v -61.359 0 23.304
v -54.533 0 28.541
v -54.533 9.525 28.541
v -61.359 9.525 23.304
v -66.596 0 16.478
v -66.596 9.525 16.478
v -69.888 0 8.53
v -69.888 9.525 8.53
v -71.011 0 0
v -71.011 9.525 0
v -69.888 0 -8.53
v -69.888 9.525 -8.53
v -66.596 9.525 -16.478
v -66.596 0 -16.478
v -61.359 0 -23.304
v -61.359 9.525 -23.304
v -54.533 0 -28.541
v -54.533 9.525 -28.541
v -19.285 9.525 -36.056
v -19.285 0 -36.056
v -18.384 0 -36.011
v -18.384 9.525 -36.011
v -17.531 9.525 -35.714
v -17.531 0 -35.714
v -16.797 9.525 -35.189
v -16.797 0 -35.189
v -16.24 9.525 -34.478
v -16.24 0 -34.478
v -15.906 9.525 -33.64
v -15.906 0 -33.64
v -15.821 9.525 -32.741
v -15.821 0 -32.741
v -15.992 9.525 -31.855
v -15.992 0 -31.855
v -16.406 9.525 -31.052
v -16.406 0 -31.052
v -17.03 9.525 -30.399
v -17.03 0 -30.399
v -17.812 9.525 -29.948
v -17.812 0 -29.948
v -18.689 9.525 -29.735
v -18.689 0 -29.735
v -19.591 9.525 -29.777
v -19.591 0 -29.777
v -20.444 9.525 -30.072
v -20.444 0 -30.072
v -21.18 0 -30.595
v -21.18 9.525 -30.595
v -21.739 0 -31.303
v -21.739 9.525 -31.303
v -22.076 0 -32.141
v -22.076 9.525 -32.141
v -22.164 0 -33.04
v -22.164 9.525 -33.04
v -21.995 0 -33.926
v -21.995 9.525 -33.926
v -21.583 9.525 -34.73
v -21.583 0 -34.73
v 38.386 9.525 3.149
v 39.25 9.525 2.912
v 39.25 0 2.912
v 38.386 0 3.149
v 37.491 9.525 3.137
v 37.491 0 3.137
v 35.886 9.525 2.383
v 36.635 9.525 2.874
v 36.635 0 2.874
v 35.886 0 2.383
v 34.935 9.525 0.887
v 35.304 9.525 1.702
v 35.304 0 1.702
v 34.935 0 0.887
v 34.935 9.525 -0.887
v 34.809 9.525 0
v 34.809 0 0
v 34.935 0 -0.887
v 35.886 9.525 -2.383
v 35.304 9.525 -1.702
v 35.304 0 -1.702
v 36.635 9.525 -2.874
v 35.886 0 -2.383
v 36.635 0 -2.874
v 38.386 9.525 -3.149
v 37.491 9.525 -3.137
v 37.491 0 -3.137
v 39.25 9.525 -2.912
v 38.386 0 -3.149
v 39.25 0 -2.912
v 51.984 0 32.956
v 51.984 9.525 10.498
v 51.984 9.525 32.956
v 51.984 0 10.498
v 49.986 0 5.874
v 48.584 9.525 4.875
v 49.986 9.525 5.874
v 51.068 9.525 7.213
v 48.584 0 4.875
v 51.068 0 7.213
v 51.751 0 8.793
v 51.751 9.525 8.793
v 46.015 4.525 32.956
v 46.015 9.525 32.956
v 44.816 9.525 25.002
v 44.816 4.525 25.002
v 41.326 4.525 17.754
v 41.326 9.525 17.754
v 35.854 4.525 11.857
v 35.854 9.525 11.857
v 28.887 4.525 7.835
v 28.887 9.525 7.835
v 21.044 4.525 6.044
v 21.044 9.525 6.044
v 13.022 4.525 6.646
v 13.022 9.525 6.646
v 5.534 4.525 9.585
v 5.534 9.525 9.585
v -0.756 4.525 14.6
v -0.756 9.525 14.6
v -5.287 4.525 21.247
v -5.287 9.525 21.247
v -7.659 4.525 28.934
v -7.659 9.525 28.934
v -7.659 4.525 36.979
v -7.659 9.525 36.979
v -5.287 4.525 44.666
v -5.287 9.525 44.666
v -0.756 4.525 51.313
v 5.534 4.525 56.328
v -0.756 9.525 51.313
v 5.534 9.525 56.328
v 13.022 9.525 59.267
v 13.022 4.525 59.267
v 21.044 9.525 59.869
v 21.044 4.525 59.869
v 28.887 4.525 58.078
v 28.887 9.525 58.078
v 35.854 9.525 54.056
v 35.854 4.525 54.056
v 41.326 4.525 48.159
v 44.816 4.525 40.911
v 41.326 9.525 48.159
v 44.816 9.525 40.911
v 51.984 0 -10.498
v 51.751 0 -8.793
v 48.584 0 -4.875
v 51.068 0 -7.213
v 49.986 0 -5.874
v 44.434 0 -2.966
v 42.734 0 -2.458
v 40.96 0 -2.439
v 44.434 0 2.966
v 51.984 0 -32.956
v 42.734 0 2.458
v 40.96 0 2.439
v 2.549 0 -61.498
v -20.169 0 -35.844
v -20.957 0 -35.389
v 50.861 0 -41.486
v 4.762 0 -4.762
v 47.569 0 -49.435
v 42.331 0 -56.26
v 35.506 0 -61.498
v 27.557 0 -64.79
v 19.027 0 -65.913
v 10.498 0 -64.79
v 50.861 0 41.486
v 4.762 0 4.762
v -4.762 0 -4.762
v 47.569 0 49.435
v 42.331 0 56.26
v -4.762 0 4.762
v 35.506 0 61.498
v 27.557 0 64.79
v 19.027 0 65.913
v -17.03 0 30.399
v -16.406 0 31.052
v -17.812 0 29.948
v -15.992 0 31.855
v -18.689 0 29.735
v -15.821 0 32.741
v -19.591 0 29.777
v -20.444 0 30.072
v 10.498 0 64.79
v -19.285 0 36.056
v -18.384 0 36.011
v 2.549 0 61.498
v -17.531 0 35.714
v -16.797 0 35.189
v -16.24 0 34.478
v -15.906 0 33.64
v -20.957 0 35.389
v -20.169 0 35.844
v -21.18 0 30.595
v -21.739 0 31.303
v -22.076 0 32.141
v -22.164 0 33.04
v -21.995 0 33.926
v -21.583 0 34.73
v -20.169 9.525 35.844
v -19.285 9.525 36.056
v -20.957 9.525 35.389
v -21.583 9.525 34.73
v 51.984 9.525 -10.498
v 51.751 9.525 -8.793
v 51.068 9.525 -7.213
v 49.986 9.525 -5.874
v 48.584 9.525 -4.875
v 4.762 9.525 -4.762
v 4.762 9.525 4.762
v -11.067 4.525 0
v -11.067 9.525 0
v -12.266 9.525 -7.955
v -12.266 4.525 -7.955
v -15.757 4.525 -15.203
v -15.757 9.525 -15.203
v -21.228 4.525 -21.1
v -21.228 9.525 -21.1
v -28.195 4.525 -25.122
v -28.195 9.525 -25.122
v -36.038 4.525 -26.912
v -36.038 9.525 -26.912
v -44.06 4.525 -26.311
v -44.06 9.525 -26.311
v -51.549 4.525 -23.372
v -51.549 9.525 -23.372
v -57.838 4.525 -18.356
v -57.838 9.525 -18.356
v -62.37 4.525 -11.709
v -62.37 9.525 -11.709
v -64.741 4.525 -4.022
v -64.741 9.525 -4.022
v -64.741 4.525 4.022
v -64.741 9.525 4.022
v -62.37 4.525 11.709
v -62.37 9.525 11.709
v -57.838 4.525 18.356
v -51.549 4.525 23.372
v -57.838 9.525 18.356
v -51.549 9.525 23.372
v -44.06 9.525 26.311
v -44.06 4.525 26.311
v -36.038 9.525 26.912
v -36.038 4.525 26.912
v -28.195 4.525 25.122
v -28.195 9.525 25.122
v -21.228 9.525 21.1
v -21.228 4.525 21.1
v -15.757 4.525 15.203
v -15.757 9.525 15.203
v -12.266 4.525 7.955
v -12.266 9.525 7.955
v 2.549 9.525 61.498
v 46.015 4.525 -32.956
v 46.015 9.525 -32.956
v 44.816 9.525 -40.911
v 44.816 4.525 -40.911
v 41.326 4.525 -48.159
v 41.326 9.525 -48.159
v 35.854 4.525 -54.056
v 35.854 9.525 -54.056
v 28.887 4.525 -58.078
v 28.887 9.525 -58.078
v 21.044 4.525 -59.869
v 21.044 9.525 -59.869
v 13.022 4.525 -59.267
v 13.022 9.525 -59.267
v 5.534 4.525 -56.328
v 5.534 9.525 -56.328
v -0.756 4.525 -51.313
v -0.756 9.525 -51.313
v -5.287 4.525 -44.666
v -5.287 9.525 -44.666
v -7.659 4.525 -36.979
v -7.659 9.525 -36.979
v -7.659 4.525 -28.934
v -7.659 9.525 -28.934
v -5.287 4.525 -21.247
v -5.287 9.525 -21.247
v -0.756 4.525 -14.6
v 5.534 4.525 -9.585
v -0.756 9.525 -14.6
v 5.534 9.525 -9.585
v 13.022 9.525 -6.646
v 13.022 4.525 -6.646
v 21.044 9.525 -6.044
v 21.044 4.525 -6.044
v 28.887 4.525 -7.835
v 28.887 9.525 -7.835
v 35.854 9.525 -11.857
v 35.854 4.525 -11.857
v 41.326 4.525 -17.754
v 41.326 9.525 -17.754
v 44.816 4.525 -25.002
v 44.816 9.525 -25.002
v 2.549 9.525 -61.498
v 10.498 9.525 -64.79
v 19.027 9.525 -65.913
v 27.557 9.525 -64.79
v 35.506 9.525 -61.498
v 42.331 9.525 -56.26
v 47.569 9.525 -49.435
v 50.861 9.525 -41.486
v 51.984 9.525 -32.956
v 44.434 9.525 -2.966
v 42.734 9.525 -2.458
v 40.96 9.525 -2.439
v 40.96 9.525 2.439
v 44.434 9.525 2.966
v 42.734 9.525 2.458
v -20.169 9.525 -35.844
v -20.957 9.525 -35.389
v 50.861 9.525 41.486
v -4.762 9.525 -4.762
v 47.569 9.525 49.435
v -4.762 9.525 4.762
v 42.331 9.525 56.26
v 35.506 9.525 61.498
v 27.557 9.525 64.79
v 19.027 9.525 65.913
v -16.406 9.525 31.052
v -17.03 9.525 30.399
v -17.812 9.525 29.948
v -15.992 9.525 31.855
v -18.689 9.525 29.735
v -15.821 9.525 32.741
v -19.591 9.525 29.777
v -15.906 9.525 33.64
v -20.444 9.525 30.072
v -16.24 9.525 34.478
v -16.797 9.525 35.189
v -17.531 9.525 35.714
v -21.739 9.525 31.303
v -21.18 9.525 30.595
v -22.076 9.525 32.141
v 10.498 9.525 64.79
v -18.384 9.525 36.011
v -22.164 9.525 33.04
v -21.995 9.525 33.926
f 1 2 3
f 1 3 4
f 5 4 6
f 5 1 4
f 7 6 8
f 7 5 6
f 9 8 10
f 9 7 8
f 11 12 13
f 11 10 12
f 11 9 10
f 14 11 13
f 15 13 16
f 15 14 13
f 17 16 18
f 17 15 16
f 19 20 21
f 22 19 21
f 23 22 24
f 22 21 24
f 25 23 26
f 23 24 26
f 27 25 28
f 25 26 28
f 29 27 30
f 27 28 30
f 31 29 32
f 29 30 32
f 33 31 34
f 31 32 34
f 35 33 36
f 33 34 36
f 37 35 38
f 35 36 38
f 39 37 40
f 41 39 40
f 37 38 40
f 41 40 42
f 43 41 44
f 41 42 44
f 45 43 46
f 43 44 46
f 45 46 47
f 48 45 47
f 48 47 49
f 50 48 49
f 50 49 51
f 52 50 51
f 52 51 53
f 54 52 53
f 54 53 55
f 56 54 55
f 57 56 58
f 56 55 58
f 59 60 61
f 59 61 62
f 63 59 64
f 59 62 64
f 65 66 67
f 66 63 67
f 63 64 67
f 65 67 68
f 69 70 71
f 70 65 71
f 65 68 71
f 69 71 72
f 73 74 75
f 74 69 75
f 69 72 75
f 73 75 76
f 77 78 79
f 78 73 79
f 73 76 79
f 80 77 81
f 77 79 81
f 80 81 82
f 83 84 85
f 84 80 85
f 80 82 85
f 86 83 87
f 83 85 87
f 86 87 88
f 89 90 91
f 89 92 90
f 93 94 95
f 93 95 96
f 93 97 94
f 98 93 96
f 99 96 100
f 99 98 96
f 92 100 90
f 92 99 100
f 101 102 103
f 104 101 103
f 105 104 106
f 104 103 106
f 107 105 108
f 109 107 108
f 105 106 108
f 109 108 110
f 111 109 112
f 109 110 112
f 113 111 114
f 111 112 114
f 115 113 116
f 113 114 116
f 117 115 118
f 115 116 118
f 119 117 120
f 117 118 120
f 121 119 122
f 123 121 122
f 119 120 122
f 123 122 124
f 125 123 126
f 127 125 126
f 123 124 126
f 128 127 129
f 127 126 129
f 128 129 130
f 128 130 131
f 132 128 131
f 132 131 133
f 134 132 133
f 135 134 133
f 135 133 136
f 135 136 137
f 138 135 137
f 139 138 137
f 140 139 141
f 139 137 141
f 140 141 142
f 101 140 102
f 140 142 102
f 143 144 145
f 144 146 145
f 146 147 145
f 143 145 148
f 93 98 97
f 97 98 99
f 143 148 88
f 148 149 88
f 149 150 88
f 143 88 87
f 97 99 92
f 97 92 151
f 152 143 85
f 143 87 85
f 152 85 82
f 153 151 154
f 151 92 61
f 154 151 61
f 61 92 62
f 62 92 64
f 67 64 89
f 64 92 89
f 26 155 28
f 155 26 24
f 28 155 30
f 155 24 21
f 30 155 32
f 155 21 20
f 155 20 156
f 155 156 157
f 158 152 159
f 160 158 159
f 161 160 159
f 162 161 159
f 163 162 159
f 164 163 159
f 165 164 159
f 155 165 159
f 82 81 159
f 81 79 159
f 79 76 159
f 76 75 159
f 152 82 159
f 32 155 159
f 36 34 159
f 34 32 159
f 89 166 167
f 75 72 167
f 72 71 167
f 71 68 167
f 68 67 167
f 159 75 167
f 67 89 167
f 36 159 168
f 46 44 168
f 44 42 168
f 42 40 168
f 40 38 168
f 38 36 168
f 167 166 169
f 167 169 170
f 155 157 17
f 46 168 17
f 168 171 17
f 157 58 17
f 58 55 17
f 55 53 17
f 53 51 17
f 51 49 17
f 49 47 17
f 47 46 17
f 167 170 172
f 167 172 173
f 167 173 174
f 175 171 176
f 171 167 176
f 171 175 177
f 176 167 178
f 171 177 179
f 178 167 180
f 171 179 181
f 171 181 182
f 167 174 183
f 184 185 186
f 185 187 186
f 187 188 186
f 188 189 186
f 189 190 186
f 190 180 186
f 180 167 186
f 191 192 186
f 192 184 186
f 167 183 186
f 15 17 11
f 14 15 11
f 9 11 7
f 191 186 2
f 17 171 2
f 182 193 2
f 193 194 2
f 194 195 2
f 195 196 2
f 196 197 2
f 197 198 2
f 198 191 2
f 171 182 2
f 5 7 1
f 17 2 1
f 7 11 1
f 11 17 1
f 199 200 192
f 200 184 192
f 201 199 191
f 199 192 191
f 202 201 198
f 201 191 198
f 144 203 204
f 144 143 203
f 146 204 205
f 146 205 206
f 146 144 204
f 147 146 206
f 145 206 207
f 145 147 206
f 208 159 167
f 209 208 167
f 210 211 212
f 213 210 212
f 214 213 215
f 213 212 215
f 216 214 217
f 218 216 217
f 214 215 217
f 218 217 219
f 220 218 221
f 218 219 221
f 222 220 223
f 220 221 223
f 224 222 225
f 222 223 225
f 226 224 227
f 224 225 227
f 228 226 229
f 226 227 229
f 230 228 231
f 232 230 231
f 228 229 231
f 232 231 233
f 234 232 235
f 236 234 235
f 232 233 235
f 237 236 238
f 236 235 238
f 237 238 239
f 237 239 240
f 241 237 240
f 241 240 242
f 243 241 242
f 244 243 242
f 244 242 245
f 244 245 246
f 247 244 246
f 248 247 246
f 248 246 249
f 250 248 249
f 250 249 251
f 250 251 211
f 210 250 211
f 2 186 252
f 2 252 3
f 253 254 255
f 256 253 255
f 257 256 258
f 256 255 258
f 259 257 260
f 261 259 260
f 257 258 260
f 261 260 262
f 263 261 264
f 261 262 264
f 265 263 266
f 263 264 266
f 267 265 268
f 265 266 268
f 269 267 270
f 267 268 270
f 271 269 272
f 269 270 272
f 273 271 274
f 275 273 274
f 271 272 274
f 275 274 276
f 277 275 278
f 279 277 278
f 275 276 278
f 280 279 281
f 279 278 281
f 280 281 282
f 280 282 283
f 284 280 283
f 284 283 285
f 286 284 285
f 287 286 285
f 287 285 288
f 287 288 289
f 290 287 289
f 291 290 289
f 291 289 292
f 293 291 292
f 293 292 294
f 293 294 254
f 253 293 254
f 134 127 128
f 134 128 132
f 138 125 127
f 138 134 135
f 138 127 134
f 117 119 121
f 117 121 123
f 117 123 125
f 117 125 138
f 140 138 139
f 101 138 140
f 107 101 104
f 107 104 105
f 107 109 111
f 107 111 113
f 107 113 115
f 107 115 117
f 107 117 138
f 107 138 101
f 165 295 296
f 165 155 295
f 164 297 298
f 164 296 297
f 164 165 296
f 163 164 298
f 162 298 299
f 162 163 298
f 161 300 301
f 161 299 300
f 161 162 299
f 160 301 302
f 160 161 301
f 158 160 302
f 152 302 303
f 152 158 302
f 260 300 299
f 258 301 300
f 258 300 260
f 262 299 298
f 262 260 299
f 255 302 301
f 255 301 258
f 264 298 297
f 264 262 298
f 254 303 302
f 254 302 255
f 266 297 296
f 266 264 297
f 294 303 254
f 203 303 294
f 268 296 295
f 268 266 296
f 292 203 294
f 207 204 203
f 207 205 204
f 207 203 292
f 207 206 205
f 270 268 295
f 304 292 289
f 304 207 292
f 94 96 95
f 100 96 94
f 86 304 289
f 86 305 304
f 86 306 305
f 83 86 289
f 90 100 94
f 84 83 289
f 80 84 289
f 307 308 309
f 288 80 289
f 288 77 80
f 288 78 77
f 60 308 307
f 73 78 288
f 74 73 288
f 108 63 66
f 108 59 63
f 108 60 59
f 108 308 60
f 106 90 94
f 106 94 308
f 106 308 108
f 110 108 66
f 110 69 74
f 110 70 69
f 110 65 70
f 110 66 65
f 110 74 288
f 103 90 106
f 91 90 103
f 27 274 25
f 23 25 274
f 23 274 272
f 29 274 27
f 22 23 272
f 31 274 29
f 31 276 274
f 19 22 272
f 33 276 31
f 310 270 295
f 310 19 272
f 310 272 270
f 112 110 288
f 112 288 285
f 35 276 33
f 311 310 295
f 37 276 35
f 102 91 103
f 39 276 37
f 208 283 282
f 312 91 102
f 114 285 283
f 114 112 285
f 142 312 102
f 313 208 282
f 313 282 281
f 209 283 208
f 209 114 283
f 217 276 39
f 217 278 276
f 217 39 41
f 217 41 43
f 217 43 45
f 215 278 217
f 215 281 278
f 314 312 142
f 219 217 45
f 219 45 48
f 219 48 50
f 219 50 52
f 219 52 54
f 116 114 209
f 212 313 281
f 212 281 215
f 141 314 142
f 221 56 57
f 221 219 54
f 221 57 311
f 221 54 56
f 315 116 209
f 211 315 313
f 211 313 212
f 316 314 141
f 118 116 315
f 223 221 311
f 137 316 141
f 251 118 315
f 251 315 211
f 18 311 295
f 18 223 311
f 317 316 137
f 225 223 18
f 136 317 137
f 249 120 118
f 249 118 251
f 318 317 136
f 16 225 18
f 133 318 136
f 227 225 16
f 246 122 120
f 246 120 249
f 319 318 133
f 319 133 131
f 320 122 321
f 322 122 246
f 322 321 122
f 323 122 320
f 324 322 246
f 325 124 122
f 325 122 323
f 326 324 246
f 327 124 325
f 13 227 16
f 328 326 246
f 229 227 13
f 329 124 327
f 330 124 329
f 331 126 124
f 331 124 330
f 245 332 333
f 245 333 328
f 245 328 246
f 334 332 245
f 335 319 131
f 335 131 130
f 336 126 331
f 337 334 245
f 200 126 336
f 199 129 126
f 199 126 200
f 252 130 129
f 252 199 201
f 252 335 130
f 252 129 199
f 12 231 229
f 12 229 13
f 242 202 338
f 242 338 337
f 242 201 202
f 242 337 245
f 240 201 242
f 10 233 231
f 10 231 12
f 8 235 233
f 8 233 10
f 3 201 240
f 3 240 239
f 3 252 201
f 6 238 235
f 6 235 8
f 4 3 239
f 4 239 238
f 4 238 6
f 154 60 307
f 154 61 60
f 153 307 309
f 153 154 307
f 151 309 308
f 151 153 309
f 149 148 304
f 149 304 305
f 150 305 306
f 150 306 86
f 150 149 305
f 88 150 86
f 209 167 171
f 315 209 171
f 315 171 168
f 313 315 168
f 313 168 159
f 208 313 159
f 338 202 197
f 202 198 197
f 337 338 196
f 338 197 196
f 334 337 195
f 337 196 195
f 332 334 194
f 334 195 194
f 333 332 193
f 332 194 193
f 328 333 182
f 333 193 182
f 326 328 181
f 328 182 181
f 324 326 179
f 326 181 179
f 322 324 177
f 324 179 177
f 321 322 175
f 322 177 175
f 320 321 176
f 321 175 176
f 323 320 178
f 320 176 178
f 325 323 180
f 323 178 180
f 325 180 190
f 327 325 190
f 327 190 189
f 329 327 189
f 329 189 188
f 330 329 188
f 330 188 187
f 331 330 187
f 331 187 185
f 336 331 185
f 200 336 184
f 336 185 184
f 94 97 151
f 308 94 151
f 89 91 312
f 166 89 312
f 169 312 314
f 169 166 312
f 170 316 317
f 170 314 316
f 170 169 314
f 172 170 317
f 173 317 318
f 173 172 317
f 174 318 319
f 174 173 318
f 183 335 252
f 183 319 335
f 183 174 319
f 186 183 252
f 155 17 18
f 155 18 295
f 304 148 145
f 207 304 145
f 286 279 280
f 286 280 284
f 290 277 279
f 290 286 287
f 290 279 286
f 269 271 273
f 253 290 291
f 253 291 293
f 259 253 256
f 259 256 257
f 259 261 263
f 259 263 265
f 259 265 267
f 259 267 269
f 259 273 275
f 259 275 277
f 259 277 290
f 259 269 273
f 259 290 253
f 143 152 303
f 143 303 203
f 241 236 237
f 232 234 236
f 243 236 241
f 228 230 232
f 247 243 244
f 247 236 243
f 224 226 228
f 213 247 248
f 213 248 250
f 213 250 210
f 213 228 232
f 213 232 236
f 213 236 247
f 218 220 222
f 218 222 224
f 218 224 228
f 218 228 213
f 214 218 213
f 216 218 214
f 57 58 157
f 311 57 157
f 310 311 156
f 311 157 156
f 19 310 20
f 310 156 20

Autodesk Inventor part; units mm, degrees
ref_plane "YZ Plane" through (0, 0, 0) normal (1, 0, 0) x (0, 1, 0)
ref_plane "XZ Plane" through (0, 0, 0) normal (0, 1, 0) x (-1, 0, 0)
ref_plane "XY Plane" through (0, 0, 0) normal (0, 0, 1) x (1, 0, 0)
sketch "Sketch1" plane through (0, 0, 0) normal (0, 1, 0) x (-1, 0, 0)
  line L0 (54.5331, -28.5412) -> (-2.5492, -61.4977)
  line L1 (-51.9839, -32.9565) -> (-51.9839, 32.9565)
  line L2 (-2.5492, 61.4977) -> (54.5331, 28.5412)
  circle A0 centre (38.0549, 0) radius 32.9565 construction
  circle A1 centre (-19.0274, 32.9565) radius 32.9565 construction
  circle A2 centre (-19.0274, -32.9565) radius 32.9565 construction
  line L3 (4.7625, -4.7625) -> (-4.7625, -4.7625)
  line L4 (-4.7625, -4.7625) -> (-4.7625, 4.7625)
  line L5 (-4.7625, 4.7625) -> (4.7625, 4.7625)
  line L6 (4.7625, 4.7625) -> (4.7625, -4.7625)
  line L7 (4.7625, -4.7625) -> (-4.7625, 4.7625) construction
  line L8 (-4.7625, -4.7625) -> (4.7625, 4.7625) construction
  line L9 (-51.9839, 4.875) -> (-48.5839, 4.875)
  line L10 (-48.5839, 4.875) -> (-40.8685, 1.3266)
  line L11 (-40.8685, -1.3266) -> (-48.5839, -4.875)
  line L12 (-48.5839, -4.875) -> (-51.9839, -4.875)
  arc A3 (54.5331, -28.5412) -> (54.5331, 28.5412) centre (38.0549, 0) ccw
  arc A4 (-2.5492, 61.4977) -> (-51.9839, 32.9565) centre (-19.0274, 32.9565) ccw
  arc A5 (-51.9839, -32.9565) -> (-2.5492, -61.4977) centre (-19.0274, -32.9565) ccw
  arc A6 (-40.8685, -1.3266) -> (-40.8685, 1.3266) centre (-37.9839, 0) ccw
  line L13 (-37.9839, 0) -> (-40.8685, -1.3266) construction
  line L14 (-37.9839, 0) -> (-40.8685, 1.3266) construction
  arc A7 (21.5831, -34.7299) -> (19.2854, -36.0565) centre (18.992, -32.8951) ccw
  arc A8 (19.2854, 36.0565) -> (21.5831, 34.7299) centre (18.992, 32.8951) ccw
  circle A9 centre (18.992, 32.8951) radius 3.175
  circle A10 centre (18.992, -32.8951) radius 3.175
  point P0 (0, 0)
  point P1 (0, 0)
  point P2 (-51.9839, 0)
  point P3 (21.5831, 34.7299)
  point P4 (21.5831, -34.7299)
  dimension "d0" = 9.525
  dimension "d1" = 9.525
  dimension "d2" = 65.913
  dimension "d5" = 14
  dimension "d6" = 3.4
  dimension "d7" = 9.75
  dimension "d12" = 6.35
  dimension "d15" = 360
extrude "Extrusion1" add sketch "Sketch1" along normal blind 9.525 contours L0 A5 L1 L12 L11 A6 L10 L9 A4 L2 A3
fillet "Fillet1" radius 6.35 7 edges at (51.9839, 4.7625, 4.875) (51.9839, 4.7625, -4.875) (51.9839, 4.7625, 32.9565) (-54.5331, 4.7625, -28.5412) (51.9839, 4.7625, -32.9565) (40.8685, 4.7625, 1.3266) (40.8685, 4.7625, -1.3266)
sketch "Sketch2" plane through (0, 9.525, 0) normal (0, 1, 0) x (1, 0, 0)
  circle A0 centre (19.0274, -32.9565) radius 32.9565
  circle A1 centre (19.0274, -32.9565) radius 26.9875
  circle A2 centre (19.0274, 32.9565) radius 32.9565
  circle A3 centre (19.0274, 32.9565) radius 26.9875
  circle A4 centre (-38.0549, 0) radius 32.9565
  circle A5 centre (-38.0549, 0) radius 26.9875
  line L0 (-54.5331, -28.5412) -> (2.5492, -61.4977) projected
  line L1 (2.5492, 61.4977) -> (-54.5331, 28.5412) projected
  line L2 (51.9839, -32.9565) -> (51.9839, 32.9565) projected
  line L3 (51.9839, -32.9565) -> (51.9839, 32.9565) projected
  point P0 (0, 0)
  point P1 (-94.4429, -5.4993)
  point P2 (42.4589, -84.5396)
  point P3 (42.4589, 84.5396)
  point P4 (-94.4429, 5.4993)
  point P5 (51.9839, 10.4982)
  point P6 (51.9839, 79.0403)
  point P7 (51.9839, -79.0403)
  point P8 (51.9839, -10.4982)
  point P9 (2.5492, 61.4977)
  point P10 (-54.5331, 28.5412)
  point P11 (-9.5137, 16.4782)
  point P12 (-54.5331, -28.5412)
  point P13 (2.5492, -61.4977)
  point P14 (-9.5137, -16.4783)
  point P15 (19.0274, 0)
  dimension "d9" = 53.975
extrude "Extrusion2" cut sketch "Sketch2" against normal blind 5 contours A1 | A3 | A5
properties part number "TOP_PLATE_WEIGHTS_TREBUCHET" material "Wood (Birch)"
